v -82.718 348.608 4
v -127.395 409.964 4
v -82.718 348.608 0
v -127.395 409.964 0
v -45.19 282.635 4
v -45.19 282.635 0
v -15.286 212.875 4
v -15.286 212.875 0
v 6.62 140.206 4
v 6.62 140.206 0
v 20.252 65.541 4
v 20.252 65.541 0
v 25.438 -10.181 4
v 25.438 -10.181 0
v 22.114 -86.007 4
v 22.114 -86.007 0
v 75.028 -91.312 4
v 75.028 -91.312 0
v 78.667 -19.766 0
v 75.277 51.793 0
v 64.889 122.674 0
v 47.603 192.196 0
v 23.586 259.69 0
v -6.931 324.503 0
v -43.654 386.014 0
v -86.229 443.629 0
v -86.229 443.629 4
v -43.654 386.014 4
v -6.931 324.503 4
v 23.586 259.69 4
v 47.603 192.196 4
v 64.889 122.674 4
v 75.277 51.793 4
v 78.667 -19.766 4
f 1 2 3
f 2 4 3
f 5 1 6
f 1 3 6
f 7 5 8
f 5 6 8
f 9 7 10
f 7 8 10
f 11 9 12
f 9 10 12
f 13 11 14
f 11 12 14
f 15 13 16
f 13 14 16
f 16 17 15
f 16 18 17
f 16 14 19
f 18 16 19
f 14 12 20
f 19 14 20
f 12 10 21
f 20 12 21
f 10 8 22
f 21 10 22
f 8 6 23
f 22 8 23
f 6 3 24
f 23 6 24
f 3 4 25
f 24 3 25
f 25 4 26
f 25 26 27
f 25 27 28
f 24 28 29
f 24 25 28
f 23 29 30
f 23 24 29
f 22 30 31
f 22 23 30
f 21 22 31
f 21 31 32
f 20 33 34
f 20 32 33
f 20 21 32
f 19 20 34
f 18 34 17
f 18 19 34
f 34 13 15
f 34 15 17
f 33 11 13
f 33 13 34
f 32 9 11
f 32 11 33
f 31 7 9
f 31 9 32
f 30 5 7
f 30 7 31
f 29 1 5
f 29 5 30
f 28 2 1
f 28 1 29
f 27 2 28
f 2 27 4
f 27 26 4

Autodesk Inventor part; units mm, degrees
ref_plane "YZ Plane" through (0, 0, 0) normal (1, 0, 0) x (0, 1, 0)
ref_plane "XZ Plane" through (0, 0, 0) normal (0, 1, 0) x (-1, 0, 0)
ref_plane "Work Plane1" through (0, 0, 0) normal (0, 0, 1) x (1, 0, 0)
sketch "Sketch1" plane through (0, 0, 0) normal (0, 0, 1) x (1, 0, 0)
  line L0 (-507.2437, -32.9396) -> (89.7639, -92.7893) construction
  arc A0 (22.3112, -84.0063) -> (-126.1247, 408.4057) centre (-651.3316, -18.4949) ccw construction
  line L1 (-74.7461, 453.0192) -> (-539.2143, 73.1912) construction
  line L2 (46.1596, 196.9837) -> (49.0458, 187.4093) construction
  arc A1 (75.0276, -91.312) -> (47.6027, 192.1965) centre (-651.3316, -18.4949) ccw
  arc A2 (47.6027, 192.1965) -> (-86.2286, 443.6292) centre (-651.3316, -18.4949) ccw
  arc A3 (22.1136, -86.0074) -> (-127.3954, 409.9642) centre (-651.3316, -18.4949) ccw
  line L3 (75.0276, -91.312) -> (22.1136, -86.0074)
  line L4 (-86.2286, 443.6292) -> (-127.3954, 409.9642)
  point P0 (0, 0)
extrude "Extrusion1" add sketch "Sketch1" along normal blind 4
properties part number "externalSupportRear1" material "Wood (Cherry)"
